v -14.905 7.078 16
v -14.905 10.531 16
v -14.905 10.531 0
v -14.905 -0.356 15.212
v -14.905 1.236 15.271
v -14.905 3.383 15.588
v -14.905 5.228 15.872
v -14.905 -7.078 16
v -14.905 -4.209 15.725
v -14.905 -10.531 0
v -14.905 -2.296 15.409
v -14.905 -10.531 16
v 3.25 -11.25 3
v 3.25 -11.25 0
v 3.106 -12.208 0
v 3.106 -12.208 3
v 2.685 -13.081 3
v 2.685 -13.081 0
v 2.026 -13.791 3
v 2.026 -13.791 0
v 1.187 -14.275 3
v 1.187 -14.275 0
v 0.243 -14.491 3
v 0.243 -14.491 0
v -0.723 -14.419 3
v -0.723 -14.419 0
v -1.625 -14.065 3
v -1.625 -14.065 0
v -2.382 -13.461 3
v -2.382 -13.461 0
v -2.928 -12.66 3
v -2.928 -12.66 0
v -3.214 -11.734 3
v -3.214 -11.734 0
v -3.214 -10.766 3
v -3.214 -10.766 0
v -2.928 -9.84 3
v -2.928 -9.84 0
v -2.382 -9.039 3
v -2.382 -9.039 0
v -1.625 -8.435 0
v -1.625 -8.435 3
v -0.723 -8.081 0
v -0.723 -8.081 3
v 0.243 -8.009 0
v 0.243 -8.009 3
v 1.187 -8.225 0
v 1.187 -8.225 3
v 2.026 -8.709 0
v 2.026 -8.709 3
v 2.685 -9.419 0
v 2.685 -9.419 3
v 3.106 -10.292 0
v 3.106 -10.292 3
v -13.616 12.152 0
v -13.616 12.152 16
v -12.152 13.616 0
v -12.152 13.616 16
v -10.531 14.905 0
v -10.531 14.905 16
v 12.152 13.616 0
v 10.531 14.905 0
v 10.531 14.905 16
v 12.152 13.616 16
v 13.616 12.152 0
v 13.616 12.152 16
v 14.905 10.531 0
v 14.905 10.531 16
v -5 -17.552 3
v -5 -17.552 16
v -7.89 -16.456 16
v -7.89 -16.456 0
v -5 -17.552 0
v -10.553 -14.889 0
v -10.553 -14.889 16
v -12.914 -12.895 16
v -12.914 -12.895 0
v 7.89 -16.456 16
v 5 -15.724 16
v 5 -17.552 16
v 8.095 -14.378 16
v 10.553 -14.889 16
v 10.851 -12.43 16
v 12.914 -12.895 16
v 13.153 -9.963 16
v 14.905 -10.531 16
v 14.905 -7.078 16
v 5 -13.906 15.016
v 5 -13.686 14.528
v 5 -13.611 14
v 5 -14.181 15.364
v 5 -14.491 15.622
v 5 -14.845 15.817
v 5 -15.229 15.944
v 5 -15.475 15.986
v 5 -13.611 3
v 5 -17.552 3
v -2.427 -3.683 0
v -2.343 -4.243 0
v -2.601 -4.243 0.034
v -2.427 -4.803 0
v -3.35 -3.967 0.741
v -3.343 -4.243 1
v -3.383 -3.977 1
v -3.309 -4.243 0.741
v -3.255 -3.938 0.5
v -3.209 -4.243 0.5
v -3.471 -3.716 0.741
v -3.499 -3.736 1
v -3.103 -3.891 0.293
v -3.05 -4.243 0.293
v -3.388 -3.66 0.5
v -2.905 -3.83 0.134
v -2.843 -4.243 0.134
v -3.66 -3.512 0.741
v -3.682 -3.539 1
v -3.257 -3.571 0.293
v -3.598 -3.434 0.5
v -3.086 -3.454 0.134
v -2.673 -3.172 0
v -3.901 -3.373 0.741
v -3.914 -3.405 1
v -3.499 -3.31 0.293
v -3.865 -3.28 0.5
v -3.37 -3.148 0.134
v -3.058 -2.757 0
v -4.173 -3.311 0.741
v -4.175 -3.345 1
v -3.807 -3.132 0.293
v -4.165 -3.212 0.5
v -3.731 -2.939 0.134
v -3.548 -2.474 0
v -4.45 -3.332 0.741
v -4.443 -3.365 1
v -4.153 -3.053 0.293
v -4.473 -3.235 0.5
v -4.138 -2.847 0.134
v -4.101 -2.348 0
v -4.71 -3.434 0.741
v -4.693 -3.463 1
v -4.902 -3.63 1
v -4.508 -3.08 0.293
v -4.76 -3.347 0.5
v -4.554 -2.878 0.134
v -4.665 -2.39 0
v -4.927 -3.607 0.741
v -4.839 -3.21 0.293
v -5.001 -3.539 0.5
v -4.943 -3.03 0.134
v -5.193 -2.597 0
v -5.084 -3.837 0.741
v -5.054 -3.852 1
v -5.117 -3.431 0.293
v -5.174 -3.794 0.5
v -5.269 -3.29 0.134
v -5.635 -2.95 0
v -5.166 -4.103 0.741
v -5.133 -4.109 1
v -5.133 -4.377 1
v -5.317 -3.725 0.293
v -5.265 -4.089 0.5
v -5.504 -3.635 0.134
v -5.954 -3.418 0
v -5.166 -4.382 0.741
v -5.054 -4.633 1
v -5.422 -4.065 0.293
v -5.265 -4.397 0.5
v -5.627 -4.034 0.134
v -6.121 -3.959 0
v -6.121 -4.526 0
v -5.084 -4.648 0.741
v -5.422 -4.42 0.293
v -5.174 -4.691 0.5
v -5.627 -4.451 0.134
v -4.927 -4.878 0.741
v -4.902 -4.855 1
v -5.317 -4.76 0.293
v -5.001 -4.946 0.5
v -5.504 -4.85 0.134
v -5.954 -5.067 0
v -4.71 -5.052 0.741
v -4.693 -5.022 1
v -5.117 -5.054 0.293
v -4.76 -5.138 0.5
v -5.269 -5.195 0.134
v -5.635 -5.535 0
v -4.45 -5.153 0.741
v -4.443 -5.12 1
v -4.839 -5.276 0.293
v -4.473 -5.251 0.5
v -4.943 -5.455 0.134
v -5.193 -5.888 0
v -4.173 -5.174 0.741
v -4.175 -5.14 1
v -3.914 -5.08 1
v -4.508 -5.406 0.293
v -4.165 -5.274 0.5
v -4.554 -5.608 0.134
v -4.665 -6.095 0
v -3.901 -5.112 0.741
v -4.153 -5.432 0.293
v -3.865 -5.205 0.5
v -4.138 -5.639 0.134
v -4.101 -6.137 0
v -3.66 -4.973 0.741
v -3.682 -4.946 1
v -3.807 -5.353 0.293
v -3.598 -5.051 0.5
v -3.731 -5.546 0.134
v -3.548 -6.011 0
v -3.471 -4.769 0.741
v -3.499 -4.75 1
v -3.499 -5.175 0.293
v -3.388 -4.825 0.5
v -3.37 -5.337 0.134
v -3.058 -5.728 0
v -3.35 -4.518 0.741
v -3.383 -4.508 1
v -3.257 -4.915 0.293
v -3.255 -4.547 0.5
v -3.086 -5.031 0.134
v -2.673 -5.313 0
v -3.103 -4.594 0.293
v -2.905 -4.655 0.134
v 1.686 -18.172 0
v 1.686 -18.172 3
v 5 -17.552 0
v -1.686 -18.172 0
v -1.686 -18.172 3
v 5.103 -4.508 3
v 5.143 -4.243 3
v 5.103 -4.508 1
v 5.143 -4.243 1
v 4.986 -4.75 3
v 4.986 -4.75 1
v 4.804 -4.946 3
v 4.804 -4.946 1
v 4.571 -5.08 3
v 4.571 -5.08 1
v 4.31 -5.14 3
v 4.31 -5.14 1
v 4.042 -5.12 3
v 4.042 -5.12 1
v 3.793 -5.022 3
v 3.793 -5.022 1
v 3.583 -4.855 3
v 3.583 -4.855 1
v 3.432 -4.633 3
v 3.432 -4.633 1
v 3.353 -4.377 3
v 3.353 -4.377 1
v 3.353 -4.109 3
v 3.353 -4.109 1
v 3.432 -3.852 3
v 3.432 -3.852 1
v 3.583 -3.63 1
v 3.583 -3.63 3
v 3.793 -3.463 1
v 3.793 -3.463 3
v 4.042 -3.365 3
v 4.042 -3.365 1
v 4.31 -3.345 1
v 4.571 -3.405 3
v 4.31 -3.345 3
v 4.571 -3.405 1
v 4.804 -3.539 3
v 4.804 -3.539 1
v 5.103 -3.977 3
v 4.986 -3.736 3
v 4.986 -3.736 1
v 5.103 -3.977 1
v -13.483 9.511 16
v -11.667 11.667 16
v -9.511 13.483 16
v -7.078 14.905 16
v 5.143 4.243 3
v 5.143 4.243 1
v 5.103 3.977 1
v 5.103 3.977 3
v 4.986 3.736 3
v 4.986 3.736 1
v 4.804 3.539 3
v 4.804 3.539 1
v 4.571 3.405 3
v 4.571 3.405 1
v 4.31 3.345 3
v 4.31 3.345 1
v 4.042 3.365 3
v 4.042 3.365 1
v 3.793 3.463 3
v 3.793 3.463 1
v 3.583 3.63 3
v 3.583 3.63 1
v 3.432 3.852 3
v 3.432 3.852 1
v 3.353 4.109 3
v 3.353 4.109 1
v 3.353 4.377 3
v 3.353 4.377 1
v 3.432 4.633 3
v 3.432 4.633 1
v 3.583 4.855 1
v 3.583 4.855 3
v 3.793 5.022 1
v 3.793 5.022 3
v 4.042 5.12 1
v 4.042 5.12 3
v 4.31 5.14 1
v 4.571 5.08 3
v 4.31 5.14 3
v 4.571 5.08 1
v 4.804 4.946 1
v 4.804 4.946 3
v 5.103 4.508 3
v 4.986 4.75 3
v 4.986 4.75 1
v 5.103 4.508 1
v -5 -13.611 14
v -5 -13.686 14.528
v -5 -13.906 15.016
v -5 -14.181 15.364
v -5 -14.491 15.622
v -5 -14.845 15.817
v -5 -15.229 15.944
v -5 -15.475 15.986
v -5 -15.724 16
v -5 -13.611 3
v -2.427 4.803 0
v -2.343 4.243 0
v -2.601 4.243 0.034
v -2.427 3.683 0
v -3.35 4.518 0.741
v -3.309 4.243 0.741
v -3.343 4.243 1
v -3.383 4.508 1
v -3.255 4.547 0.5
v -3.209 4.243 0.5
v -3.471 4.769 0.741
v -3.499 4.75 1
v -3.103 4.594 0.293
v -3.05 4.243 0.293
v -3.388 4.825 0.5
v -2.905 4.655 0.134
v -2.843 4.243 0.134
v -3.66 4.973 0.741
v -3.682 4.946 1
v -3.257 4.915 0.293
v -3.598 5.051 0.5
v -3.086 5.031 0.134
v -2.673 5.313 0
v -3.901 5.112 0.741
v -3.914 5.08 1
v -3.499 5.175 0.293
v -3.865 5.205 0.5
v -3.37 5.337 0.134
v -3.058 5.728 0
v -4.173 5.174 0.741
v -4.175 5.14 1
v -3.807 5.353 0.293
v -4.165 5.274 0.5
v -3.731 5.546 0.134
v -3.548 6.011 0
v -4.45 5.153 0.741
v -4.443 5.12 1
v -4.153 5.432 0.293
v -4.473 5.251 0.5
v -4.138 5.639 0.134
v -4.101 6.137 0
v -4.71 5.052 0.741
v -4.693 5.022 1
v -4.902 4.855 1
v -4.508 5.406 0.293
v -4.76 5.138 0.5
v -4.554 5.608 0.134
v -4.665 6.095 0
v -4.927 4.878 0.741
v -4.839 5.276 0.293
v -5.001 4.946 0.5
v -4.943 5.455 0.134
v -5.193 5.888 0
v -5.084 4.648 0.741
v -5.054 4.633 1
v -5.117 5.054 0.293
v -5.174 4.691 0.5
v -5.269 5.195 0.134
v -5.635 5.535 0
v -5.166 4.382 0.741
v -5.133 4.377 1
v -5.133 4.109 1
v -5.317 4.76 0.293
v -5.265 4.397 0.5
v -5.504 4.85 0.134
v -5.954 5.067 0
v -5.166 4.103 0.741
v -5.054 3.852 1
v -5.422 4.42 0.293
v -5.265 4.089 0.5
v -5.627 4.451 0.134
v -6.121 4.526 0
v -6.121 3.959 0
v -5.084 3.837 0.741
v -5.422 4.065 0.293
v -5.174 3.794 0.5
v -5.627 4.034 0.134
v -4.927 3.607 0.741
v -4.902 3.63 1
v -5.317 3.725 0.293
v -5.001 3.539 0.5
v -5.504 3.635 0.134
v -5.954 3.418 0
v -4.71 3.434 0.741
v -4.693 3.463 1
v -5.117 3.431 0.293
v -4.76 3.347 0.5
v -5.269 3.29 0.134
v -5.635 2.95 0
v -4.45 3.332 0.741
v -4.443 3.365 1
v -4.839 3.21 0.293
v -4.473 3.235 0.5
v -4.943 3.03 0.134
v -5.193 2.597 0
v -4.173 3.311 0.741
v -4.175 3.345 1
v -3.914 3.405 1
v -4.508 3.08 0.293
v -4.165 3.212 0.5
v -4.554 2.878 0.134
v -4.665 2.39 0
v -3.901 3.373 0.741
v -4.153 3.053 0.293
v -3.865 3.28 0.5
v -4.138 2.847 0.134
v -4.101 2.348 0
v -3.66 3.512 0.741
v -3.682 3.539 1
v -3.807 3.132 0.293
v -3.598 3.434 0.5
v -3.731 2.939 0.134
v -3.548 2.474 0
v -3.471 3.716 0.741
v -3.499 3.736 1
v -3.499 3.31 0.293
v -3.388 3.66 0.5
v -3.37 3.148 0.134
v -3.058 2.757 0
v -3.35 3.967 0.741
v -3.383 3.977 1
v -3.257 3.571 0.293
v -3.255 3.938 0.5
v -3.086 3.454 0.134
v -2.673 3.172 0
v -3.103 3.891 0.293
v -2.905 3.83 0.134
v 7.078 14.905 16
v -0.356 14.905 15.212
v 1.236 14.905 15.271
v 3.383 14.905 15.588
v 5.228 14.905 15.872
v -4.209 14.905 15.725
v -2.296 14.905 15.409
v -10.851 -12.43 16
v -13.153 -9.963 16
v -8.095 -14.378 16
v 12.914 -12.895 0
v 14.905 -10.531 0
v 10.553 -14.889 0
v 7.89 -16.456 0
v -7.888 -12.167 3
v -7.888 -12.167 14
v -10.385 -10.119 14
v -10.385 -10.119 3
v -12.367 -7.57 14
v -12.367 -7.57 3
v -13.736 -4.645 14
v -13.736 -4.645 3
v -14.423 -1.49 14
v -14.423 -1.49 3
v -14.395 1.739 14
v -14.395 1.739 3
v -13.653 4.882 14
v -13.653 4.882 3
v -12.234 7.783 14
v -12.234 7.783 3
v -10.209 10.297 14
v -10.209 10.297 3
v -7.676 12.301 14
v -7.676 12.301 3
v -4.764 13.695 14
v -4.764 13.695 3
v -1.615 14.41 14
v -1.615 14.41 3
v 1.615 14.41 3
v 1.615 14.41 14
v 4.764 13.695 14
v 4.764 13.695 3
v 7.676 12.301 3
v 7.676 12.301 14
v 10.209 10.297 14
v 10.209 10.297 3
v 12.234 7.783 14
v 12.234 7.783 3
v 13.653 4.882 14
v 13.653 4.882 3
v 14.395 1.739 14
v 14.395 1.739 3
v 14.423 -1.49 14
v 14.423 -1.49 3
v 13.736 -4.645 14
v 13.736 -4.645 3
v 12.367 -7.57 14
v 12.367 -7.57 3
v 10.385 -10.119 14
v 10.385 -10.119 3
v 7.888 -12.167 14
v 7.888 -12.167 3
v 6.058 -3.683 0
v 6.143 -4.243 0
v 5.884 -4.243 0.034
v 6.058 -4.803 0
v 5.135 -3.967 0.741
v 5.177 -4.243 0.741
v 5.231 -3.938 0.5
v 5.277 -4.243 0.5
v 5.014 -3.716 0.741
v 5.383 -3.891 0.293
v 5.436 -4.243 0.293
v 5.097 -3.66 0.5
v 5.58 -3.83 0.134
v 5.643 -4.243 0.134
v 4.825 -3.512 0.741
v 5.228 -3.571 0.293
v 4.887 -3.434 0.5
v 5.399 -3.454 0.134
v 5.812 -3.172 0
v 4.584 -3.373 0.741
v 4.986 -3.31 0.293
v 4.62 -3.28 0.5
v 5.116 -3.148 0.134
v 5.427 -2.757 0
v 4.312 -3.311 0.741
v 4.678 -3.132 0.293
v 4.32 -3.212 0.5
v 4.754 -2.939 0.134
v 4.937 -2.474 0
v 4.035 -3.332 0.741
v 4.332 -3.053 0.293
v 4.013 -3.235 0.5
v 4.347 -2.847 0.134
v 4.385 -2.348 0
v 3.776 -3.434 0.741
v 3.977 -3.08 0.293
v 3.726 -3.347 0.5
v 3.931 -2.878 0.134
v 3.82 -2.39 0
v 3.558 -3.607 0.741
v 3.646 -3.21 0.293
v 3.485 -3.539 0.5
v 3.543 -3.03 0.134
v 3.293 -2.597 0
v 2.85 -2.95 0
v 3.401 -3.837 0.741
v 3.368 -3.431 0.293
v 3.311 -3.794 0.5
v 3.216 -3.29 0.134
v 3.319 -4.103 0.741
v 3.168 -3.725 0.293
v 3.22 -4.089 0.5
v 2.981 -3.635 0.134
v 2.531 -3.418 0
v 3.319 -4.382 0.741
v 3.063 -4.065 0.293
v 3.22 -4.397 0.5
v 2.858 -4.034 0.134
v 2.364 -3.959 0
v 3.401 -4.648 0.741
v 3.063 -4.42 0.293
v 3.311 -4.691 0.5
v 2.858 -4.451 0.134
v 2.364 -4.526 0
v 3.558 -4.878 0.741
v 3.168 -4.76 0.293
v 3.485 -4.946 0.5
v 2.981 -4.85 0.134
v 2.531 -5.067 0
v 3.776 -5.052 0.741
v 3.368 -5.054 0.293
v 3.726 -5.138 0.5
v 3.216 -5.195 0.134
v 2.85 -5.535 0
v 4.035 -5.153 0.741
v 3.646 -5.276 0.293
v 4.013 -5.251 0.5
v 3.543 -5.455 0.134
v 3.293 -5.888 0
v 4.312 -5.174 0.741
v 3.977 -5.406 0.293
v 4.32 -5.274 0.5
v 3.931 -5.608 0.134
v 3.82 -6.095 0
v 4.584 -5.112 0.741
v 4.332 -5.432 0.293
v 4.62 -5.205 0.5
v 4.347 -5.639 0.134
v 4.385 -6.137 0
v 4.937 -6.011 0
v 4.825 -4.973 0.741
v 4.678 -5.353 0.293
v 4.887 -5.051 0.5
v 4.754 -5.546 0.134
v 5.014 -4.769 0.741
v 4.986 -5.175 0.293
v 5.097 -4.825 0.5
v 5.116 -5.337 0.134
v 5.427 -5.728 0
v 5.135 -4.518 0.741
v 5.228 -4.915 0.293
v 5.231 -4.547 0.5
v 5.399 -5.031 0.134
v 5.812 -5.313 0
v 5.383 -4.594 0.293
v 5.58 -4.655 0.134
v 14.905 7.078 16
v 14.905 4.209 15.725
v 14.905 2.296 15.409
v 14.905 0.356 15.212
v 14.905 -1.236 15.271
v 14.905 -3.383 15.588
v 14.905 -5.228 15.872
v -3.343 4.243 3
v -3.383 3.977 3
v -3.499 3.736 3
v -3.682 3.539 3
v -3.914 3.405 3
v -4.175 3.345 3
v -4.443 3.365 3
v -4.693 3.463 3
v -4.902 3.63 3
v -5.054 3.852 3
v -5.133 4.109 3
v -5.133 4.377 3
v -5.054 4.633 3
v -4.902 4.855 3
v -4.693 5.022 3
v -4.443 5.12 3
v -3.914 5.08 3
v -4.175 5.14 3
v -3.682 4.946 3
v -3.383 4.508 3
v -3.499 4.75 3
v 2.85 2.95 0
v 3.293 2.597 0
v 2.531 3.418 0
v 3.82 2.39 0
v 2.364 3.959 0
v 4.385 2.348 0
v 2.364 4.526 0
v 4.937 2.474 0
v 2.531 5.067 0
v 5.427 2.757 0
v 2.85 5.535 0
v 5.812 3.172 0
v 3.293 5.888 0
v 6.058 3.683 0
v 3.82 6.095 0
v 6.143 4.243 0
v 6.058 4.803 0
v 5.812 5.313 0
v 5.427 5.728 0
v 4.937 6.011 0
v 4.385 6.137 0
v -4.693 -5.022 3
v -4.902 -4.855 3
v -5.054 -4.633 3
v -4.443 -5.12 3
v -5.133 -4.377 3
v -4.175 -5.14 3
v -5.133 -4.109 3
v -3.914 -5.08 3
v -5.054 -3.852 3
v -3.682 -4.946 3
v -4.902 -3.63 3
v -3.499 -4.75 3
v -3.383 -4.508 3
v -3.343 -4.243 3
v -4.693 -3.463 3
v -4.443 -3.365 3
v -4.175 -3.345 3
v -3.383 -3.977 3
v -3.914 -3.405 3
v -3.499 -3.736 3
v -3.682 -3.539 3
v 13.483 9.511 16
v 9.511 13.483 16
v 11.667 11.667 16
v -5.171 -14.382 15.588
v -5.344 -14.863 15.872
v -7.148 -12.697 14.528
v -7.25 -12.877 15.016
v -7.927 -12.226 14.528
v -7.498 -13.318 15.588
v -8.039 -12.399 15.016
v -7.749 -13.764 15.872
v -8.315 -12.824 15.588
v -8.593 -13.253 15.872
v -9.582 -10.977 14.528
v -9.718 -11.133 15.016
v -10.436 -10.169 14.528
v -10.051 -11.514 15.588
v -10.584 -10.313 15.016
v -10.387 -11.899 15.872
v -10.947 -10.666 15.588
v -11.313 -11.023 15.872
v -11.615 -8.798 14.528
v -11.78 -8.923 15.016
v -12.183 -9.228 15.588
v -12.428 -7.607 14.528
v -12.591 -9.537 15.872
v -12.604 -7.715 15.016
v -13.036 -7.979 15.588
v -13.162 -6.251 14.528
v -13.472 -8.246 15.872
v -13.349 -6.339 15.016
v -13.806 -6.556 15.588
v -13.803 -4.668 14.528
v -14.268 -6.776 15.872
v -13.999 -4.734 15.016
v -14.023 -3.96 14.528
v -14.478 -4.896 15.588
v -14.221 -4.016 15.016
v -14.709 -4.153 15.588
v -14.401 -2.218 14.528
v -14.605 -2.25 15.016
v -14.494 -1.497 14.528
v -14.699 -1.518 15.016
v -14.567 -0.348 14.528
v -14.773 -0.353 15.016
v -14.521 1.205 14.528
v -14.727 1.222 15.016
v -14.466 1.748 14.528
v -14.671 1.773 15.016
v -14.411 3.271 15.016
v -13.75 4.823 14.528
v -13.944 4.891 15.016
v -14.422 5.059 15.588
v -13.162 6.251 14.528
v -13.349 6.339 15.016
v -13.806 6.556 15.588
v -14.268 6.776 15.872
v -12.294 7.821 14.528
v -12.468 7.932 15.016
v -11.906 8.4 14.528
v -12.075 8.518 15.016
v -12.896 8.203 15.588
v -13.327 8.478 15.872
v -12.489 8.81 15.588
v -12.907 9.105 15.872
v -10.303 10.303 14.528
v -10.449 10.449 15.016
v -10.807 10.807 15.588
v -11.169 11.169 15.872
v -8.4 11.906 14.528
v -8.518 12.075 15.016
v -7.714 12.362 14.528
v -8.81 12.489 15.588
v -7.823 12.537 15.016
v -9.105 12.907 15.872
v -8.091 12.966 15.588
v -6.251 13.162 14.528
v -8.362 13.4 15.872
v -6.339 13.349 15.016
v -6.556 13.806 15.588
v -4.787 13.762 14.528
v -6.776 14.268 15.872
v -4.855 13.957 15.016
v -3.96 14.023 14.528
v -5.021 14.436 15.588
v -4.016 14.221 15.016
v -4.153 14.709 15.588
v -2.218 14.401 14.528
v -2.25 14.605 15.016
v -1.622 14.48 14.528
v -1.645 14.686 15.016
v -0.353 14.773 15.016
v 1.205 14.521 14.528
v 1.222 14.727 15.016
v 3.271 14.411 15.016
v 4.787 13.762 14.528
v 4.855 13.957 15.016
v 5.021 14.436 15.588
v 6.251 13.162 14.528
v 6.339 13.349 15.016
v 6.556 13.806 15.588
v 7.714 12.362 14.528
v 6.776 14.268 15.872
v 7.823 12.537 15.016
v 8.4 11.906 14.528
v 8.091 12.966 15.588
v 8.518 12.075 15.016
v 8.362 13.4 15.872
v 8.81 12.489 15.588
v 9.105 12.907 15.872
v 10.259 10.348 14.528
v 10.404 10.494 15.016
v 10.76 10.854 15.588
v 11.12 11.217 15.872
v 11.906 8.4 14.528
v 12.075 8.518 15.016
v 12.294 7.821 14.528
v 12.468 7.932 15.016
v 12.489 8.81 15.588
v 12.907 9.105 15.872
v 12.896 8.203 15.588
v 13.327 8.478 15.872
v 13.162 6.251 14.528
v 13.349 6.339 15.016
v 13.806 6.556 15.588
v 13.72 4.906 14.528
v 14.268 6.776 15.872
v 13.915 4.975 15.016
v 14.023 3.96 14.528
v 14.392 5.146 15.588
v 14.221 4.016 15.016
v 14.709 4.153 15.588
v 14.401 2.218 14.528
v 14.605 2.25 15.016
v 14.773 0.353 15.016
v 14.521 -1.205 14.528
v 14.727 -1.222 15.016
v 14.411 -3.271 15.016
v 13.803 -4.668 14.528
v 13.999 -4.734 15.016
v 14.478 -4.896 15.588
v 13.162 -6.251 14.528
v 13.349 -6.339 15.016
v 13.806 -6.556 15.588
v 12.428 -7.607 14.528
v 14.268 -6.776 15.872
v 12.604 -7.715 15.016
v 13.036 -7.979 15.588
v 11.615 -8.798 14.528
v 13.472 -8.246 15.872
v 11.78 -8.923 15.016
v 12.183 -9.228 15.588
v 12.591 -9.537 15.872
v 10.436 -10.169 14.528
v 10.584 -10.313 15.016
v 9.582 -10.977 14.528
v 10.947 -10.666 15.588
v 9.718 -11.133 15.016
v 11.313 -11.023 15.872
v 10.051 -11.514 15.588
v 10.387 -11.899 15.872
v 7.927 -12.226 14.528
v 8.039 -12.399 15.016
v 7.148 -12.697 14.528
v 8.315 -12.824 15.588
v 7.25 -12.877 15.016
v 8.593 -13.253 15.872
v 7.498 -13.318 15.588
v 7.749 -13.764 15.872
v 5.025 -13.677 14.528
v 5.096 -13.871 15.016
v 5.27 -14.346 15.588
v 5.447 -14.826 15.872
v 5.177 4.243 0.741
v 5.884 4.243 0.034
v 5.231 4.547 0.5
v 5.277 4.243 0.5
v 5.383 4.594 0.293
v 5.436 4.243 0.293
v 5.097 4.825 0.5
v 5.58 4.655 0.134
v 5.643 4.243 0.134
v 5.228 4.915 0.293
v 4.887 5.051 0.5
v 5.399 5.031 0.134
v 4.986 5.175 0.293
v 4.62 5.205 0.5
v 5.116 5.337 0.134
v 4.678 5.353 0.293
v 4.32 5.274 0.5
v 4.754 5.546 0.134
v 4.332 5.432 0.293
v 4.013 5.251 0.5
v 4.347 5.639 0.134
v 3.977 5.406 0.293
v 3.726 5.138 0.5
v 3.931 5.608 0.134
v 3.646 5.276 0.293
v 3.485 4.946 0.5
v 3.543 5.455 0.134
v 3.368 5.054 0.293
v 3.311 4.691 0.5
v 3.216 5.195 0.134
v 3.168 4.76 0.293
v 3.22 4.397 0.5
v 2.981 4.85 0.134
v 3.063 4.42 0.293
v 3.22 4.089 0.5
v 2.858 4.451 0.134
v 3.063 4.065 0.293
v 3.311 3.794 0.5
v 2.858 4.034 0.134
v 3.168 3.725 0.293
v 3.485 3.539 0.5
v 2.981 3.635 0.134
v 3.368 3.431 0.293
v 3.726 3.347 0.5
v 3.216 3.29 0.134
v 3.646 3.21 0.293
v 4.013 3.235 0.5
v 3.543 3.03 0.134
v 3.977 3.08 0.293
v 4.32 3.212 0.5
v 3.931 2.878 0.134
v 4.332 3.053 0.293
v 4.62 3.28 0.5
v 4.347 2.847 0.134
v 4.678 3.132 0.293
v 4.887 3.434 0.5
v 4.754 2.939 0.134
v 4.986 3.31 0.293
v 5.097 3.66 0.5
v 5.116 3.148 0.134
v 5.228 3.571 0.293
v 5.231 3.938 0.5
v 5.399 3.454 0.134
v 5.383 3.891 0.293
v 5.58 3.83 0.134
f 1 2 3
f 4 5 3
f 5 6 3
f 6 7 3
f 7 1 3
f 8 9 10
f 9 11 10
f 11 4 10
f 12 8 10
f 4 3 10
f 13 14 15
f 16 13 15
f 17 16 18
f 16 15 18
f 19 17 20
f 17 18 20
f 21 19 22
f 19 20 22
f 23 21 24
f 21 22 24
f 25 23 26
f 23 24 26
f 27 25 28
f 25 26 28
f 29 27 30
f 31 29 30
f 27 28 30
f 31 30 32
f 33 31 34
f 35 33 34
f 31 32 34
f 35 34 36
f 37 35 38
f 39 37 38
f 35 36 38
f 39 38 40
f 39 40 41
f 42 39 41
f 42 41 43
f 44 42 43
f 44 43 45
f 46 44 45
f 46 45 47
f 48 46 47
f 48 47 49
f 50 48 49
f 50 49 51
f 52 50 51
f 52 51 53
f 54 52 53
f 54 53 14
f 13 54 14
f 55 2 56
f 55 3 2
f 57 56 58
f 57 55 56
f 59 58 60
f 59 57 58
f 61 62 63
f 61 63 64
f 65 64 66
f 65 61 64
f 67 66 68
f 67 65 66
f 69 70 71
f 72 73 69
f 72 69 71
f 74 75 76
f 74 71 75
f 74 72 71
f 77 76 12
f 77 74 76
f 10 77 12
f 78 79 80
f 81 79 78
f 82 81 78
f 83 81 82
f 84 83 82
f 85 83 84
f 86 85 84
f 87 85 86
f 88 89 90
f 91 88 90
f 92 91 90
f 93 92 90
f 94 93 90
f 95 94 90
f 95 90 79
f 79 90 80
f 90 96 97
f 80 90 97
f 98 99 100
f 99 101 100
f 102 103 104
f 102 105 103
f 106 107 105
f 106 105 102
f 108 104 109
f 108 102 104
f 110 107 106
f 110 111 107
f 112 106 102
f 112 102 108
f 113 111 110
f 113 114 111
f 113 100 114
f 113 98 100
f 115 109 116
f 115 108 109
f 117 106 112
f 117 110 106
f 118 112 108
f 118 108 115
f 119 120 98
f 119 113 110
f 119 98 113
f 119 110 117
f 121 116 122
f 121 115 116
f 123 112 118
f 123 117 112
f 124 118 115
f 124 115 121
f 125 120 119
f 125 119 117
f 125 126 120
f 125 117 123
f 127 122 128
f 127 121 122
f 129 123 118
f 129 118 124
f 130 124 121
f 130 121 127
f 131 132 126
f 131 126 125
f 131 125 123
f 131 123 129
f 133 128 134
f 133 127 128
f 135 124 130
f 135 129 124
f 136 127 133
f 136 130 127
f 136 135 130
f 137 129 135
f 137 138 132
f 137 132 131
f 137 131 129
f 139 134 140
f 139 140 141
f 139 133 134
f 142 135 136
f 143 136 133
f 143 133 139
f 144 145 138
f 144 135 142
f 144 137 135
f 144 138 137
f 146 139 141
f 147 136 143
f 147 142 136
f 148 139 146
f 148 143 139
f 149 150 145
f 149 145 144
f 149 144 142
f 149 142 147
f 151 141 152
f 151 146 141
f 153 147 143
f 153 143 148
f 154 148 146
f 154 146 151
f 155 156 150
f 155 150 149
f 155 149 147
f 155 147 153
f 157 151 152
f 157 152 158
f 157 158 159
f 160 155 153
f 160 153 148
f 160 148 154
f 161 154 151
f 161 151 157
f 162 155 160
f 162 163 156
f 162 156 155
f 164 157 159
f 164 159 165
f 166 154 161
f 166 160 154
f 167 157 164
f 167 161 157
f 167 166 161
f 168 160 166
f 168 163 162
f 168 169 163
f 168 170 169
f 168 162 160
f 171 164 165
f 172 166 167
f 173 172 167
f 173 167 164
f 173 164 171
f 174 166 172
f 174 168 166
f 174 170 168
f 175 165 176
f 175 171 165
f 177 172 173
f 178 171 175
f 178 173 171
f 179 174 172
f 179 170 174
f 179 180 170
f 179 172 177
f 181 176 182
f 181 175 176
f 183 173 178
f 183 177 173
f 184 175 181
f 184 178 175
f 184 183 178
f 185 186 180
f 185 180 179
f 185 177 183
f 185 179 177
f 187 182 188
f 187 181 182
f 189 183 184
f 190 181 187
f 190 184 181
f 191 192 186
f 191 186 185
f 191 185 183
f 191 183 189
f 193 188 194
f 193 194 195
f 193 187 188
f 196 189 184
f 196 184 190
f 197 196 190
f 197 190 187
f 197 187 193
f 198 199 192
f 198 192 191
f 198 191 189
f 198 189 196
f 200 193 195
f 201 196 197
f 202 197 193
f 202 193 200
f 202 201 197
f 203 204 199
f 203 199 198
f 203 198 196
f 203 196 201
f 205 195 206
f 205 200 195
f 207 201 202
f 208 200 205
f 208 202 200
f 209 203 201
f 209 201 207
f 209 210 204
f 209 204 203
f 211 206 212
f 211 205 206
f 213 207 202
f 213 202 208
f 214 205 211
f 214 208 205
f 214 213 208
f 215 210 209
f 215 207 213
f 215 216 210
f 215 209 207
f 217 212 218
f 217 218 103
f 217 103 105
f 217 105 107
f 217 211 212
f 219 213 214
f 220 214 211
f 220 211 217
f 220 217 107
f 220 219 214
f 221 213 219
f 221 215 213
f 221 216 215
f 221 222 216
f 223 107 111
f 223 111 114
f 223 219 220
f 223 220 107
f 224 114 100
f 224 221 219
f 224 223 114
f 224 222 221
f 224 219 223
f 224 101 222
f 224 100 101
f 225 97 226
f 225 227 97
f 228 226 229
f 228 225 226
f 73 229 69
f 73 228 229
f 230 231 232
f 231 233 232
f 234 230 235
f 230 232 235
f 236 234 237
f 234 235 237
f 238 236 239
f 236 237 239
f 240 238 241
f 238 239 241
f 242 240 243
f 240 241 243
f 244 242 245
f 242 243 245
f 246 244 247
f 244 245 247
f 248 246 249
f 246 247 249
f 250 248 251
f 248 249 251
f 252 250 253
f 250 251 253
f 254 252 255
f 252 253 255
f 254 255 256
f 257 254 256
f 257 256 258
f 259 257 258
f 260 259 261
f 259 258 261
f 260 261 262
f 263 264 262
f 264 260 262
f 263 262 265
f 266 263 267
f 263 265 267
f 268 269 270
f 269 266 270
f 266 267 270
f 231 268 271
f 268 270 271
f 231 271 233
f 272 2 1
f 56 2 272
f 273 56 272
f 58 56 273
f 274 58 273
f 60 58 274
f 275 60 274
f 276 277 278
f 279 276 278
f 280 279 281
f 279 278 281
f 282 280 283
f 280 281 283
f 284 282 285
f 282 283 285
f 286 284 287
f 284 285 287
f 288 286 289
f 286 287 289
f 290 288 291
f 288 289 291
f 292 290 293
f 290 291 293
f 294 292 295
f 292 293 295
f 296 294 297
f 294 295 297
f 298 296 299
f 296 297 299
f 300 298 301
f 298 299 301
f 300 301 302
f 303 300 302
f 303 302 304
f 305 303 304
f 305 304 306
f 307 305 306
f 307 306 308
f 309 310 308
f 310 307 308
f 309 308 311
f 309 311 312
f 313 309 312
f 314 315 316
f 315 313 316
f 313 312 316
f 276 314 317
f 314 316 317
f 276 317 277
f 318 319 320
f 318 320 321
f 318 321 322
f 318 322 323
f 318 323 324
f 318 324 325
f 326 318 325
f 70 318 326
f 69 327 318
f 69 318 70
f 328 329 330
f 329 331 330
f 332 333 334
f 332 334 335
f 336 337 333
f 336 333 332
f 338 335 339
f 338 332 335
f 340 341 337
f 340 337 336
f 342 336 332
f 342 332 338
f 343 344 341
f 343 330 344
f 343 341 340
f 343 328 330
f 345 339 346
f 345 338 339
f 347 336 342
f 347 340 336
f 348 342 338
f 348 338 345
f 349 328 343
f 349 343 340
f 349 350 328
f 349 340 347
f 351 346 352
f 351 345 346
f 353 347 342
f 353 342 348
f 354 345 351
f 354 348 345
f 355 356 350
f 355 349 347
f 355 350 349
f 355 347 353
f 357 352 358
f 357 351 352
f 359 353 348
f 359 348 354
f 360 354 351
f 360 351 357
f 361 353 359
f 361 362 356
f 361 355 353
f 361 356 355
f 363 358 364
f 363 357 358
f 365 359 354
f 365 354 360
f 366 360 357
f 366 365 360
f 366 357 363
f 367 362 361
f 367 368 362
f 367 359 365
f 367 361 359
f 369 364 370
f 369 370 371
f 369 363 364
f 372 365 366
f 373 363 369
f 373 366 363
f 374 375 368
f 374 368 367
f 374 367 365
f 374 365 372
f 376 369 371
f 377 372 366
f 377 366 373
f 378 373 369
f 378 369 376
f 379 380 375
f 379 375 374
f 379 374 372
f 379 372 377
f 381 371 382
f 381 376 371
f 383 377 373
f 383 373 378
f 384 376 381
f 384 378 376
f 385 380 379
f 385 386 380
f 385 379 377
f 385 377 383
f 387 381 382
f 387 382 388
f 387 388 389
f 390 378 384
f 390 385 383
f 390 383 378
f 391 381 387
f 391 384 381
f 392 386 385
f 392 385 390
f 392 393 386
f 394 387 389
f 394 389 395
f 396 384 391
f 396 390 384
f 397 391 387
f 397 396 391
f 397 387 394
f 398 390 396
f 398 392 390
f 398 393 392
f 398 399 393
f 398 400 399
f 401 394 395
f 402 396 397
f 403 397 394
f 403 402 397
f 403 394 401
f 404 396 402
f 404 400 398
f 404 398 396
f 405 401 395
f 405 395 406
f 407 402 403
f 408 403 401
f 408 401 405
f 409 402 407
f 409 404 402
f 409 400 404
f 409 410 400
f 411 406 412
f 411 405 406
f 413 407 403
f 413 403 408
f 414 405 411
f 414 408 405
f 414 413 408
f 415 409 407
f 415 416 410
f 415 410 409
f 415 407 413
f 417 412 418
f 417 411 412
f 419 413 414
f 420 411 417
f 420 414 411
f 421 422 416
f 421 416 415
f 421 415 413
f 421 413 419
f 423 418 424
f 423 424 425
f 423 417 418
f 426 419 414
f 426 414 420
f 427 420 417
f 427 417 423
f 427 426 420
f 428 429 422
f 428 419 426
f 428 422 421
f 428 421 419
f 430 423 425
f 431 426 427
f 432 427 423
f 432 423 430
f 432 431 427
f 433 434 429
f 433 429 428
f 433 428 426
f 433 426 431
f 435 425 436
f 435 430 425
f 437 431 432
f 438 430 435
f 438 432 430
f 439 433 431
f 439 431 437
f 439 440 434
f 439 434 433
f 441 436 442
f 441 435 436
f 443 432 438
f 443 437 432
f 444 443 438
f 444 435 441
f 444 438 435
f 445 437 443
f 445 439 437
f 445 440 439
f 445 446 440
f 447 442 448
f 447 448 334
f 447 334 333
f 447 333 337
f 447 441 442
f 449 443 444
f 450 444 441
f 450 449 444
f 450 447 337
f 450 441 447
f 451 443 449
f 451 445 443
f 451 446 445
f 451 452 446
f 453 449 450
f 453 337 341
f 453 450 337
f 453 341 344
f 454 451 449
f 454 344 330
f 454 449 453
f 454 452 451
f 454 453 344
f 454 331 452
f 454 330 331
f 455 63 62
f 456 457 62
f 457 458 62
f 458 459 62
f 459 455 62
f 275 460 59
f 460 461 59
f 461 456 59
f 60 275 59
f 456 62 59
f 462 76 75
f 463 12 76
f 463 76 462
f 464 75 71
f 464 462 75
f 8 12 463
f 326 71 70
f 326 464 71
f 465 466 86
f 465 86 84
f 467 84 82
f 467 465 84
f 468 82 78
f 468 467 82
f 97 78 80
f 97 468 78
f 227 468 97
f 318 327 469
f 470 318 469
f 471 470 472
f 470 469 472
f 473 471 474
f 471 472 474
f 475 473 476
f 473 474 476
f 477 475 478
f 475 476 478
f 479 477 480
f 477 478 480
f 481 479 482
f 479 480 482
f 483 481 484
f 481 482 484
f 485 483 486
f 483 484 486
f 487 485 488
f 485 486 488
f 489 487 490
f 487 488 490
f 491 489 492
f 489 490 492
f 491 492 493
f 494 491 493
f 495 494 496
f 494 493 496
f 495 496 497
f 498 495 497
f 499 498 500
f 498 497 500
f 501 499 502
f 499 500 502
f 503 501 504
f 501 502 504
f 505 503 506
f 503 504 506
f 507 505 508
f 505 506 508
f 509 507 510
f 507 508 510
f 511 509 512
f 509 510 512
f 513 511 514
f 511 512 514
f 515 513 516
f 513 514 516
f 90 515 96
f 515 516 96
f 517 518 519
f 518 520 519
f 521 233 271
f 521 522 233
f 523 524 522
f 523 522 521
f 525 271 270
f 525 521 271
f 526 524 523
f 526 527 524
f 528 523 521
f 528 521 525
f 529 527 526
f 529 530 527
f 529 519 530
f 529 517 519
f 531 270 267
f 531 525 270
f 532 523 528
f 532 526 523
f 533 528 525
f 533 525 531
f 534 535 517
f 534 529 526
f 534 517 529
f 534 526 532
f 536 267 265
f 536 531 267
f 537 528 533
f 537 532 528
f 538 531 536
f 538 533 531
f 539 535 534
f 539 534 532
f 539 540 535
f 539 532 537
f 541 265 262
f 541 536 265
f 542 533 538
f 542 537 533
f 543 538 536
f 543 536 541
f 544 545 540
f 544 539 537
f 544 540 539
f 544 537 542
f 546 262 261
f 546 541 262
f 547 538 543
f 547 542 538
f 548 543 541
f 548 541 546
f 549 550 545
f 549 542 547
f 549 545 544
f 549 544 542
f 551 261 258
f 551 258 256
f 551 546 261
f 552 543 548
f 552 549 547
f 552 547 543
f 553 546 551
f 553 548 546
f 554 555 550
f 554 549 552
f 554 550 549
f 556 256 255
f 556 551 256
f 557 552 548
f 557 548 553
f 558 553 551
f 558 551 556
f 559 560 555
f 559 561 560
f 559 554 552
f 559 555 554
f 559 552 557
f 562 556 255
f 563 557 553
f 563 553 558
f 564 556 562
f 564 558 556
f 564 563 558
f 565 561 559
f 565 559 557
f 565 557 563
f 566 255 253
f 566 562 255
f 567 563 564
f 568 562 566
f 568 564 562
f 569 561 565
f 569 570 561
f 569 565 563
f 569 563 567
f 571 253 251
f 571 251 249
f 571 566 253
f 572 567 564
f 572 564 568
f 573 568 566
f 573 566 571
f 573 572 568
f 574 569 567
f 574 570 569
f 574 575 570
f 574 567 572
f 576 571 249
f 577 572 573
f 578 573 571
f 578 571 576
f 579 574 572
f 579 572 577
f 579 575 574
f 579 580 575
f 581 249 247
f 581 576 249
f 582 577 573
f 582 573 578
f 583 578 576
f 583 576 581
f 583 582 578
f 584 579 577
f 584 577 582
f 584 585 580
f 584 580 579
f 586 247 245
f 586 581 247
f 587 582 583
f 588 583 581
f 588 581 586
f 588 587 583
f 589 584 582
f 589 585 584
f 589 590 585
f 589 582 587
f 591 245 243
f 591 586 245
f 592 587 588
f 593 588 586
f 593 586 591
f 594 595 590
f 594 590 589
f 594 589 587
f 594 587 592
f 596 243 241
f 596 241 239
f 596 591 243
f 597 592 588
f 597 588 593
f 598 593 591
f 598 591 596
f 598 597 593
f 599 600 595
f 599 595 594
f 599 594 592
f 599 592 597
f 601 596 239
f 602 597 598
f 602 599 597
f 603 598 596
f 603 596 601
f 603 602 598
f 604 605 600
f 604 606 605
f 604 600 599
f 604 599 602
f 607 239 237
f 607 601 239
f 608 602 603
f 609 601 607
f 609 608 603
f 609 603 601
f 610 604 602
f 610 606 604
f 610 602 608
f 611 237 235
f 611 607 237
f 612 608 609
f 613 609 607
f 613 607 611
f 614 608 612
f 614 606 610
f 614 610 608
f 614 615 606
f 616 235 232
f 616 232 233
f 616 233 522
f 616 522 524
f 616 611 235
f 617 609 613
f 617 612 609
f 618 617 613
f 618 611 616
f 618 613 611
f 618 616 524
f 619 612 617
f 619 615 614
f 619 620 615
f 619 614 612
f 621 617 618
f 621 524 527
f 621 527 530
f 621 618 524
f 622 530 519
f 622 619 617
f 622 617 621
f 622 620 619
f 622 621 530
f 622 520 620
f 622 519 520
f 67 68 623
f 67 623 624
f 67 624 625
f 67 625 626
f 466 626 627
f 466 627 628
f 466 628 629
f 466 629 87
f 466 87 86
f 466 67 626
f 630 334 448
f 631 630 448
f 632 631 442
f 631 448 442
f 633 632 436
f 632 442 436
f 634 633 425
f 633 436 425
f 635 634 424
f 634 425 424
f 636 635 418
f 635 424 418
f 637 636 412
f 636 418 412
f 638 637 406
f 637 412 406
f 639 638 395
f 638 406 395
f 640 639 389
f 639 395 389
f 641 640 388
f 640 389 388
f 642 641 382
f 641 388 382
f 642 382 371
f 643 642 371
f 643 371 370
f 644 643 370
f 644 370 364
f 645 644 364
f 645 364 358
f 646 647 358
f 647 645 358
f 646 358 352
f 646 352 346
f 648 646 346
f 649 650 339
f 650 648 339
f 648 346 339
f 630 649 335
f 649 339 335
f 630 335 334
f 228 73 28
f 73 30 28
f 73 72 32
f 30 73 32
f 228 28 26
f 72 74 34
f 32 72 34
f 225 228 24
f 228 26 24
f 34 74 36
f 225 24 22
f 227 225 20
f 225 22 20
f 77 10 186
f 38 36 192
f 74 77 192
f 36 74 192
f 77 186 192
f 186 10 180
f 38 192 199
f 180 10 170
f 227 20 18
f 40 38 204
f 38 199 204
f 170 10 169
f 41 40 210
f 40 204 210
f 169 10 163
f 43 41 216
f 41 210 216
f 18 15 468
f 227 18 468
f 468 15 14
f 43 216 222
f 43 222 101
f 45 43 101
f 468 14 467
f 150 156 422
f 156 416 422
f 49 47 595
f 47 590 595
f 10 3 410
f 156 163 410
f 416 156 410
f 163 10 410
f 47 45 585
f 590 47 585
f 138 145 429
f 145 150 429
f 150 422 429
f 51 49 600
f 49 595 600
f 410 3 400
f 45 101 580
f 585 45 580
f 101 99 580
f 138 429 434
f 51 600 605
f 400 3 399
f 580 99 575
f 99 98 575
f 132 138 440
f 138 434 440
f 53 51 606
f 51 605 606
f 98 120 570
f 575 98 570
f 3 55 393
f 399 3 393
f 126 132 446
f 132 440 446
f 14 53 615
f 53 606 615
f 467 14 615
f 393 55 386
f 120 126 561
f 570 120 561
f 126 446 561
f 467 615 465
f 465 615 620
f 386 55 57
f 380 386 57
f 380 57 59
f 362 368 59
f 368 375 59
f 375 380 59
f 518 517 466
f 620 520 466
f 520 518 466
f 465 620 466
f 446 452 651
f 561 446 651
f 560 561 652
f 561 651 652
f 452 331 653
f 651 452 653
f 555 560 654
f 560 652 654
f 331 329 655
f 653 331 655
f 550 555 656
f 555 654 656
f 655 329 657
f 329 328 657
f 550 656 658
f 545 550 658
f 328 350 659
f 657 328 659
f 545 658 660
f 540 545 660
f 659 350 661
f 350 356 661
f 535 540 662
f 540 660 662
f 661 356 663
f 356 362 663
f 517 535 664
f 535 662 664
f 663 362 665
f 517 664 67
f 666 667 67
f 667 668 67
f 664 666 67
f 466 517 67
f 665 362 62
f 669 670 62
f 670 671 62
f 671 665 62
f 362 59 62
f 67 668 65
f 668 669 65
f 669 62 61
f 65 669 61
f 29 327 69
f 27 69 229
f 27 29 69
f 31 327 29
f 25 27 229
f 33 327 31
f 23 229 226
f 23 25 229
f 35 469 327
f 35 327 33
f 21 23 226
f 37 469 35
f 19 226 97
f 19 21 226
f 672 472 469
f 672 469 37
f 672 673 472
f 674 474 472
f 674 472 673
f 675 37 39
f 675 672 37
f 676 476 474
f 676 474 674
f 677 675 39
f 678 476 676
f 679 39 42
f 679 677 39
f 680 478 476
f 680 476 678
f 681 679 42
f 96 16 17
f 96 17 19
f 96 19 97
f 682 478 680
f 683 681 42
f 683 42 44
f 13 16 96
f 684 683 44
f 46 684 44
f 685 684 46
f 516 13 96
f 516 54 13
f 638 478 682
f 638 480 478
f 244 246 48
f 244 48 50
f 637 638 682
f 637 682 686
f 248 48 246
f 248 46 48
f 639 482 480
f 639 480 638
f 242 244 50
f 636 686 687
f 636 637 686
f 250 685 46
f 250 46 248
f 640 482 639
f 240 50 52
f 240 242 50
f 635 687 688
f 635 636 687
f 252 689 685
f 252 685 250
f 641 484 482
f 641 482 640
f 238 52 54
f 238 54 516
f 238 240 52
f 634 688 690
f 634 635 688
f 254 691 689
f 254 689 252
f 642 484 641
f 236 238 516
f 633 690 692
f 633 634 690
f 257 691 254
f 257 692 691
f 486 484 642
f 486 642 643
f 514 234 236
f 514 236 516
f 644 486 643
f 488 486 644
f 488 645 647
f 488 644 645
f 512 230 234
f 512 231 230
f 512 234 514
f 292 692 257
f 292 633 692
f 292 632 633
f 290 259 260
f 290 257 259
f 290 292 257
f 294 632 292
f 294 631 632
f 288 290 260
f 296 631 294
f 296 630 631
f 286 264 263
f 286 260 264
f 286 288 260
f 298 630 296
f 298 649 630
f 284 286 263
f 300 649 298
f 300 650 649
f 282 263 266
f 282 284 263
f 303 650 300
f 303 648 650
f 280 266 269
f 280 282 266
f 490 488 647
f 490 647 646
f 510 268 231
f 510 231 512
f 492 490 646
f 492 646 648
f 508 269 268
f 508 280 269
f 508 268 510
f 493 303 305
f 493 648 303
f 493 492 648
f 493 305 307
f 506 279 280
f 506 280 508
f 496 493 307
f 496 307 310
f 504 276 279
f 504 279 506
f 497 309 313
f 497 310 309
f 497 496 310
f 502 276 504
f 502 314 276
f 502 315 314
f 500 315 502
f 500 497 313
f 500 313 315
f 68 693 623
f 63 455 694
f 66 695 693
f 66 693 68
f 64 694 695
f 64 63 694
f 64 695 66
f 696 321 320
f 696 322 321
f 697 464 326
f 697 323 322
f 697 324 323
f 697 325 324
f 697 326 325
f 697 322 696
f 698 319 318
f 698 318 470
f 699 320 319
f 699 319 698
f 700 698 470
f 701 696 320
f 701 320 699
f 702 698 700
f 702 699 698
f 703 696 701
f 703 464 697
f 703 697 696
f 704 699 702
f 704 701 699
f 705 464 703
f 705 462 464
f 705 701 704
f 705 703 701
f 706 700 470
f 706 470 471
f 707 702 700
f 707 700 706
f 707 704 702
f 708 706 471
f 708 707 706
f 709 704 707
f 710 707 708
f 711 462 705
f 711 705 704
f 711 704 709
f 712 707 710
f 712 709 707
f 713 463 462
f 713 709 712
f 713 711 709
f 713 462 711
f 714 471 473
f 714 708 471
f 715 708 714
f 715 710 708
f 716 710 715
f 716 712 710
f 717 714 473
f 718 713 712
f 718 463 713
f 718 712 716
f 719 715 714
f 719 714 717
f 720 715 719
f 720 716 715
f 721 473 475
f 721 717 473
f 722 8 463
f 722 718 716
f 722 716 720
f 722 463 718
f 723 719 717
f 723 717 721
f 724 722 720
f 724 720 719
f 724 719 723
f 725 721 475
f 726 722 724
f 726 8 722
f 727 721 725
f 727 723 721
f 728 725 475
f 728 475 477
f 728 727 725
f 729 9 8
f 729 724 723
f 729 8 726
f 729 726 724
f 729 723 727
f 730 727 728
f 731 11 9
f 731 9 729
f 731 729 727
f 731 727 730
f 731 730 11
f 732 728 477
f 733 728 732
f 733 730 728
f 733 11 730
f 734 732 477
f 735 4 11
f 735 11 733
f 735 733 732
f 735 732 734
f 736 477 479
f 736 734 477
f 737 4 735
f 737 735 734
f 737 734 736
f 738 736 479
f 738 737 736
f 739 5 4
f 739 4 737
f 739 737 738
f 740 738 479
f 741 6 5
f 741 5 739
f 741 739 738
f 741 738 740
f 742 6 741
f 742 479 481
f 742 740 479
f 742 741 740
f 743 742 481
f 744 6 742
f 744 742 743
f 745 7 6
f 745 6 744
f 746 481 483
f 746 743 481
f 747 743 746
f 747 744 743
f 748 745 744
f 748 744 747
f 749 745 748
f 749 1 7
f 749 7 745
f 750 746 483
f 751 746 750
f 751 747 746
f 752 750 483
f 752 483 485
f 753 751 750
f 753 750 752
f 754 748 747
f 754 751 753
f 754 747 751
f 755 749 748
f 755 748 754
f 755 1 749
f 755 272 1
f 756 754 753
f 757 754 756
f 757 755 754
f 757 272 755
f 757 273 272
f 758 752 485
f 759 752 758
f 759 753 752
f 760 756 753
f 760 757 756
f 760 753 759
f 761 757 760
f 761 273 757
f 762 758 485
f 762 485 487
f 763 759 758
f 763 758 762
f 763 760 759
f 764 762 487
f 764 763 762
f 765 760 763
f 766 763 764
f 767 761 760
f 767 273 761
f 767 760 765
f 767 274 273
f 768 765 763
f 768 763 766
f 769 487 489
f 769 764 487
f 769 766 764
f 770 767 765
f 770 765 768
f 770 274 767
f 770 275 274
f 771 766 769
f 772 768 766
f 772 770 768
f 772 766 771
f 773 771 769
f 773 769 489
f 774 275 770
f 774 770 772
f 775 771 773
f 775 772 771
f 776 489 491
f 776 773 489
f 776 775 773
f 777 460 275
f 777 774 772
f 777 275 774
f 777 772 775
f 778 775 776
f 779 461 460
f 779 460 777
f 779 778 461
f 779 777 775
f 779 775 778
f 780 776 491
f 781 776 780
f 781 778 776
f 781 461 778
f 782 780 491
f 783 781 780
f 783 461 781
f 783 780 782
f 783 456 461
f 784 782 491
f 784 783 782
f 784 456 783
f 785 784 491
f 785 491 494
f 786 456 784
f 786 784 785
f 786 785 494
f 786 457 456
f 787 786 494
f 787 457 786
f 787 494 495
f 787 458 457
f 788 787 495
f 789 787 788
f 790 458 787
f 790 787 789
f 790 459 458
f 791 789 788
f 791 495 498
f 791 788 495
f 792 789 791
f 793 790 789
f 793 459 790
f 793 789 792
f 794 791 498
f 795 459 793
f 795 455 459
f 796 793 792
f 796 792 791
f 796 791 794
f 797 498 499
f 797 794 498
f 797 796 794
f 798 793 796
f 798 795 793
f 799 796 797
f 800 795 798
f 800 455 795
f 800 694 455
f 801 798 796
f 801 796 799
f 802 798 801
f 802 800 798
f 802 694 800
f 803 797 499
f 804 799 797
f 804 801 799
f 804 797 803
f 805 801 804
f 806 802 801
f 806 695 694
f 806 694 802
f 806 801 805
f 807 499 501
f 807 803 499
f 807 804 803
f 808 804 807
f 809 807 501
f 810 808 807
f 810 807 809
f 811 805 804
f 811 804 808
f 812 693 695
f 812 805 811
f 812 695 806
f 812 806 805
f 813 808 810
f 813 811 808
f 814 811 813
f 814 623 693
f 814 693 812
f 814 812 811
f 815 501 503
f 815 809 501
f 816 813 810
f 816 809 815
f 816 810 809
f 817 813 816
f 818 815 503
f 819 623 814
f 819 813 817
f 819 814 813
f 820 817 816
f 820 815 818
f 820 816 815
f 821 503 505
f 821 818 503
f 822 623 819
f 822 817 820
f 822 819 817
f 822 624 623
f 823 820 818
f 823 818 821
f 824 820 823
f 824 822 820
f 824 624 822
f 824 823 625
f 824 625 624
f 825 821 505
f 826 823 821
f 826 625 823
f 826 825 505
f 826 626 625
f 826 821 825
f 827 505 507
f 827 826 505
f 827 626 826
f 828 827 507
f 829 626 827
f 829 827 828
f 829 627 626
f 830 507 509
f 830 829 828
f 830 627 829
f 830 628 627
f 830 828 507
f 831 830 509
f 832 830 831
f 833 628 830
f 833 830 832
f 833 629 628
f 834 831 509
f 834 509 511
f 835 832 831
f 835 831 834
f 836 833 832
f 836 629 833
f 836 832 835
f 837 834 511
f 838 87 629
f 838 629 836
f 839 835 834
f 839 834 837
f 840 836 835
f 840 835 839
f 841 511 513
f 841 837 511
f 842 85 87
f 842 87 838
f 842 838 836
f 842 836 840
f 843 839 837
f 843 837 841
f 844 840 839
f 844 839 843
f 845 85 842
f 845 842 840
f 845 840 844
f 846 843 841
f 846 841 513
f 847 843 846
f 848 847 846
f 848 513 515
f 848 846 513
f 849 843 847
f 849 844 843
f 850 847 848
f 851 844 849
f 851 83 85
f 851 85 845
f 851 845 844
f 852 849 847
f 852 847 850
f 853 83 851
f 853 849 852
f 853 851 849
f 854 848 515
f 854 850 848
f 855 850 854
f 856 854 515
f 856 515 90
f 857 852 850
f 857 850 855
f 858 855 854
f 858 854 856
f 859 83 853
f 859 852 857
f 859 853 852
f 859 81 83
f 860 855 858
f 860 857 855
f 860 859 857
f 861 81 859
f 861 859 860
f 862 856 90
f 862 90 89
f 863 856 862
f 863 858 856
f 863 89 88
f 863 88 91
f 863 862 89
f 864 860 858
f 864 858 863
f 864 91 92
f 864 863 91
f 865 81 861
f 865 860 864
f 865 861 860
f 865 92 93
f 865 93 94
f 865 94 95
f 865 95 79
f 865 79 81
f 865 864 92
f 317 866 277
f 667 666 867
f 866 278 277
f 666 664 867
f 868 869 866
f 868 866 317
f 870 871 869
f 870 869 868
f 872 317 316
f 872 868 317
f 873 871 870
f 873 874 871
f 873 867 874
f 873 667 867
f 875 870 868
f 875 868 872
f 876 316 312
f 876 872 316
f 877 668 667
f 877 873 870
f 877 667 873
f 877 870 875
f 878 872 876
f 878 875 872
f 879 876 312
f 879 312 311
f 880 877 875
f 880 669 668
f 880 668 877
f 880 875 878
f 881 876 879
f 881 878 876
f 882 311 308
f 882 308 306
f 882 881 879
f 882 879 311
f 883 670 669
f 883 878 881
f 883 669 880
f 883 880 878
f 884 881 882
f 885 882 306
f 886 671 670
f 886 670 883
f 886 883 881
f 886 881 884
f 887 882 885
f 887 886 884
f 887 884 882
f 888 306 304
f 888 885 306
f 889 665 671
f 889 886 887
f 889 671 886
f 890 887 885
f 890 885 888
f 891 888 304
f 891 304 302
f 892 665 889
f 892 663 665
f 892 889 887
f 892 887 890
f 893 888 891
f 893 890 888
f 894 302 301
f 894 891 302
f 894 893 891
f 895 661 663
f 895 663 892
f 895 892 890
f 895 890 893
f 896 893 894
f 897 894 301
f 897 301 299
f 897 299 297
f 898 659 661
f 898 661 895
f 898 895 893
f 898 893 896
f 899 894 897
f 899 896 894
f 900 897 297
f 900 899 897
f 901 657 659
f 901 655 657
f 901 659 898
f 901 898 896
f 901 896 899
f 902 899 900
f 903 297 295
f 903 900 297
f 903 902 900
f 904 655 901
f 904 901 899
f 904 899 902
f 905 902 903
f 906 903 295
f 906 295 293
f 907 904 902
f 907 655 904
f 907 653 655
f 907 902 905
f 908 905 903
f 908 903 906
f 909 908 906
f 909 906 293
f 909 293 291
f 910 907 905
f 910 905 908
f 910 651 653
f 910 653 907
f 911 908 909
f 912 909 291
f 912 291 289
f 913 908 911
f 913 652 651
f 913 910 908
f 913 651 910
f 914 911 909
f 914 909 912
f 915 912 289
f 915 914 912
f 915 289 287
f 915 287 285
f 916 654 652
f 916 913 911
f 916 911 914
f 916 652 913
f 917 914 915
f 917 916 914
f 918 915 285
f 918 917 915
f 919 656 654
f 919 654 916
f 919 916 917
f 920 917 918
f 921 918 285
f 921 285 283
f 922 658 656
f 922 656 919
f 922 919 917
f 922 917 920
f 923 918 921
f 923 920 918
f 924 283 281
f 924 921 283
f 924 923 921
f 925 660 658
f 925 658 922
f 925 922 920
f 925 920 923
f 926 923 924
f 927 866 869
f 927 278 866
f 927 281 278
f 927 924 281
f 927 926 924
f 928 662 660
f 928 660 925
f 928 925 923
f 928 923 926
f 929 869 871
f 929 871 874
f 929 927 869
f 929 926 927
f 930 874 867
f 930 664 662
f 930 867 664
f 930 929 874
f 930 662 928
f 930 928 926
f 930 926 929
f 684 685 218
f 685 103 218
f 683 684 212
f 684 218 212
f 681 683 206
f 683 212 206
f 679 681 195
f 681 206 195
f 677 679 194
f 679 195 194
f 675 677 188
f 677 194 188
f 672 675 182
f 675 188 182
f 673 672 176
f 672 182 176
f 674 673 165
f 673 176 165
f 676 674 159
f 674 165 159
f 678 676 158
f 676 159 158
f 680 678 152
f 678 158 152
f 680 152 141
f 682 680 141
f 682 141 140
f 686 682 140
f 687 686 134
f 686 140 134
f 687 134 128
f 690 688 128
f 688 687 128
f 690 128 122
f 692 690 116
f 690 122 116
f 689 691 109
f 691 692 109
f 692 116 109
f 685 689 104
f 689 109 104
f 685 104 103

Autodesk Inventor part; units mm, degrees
ref_plane "YZ Plane" through (0, 0, 0) normal (1, 0, 0) x (0, 1, 0)
ref_plane "XZ Plane" through (0, 0, 0) normal (0, 1, 0) x (-1, 0, 0)
ref_plane "XY Plane" through (0, 0, 0) normal (0, 0, 1) x (1, 0, 0)
sketch "Sketch1" plane through (0, 0, 0) normal (0, 0, 1) x (1, 0, 0)
  circle A0 centre (0, 0) radius 18.25 construction
  line L0 (12.904699, -12.904699) -> (-12.904699, 12.904699) construction
  line L1 (0, 29) -> (0, -41) construction
  line L2 (-75, 0) -> (78, 0) construction
  line L3 (-12.904699, -12.904699) -> (12.904699, 12.904699) construction
  line L4 (-12.904699, 12.904699) -> (12.904699, 12.904699) construction
  line L5 (12.904699, -12.904699) -> (12.904699, 12.904699) construction
  line L6 (-12.904699, -12.904699) -> (-12.904699, 12.904699) construction
  circle A1 centre (-4.242641, 4.242641) radius 0.9
  circle A2 centre (4.242641, 4.242641) radius 0.9
  circle A3 centre (-4.242641, -4.242641) radius 0.9
  circle A4 centre (4.242641, -4.242641) radius 0.9
  circle A5 centre (0, 0) radius 14.5
  line L7 (10.531498, 14.904699) -> (-10.531498, 14.904699)
  line L8 (-14.904699, 10.531498) -> (-14.904699, -10.531498)
  line L9 (14.904699, 10.531498) -> (14.904699, -10.531498)
  arc A6 (-10.531498, 14.904699) -> (-14.904699, 10.531498) centre (0, 0) ccw
  arc A7 (14.904699, 10.531498) -> (10.531498, 14.904699) centre (0, 0) ccw
  line L10 (-5, -13.610658) -> (-5, -17.551709)
  line L11 (5, -13.610658) -> (5, -17.551709)
  arc A8 (-14.904699, -10.531498) -> (-5, -17.551709) centre (0, 0) ccw
  arc A9 (5, -17.551709) -> (14.904699, -10.531498) centre (0, 0) ccw
  arc A10 (-5, -17.551709) -> (5, -17.551709) centre (0, 0) ccw
  circle A11 centre (0, -11.25) radius 3.25
  circle A12 centre (0, 0) radius 6 construction
  point P0 (5, -13.610658)
  point P1 (0, -14.5)
  point P2 (2.557391, -13.255556)
  point P3 (0, 0)
  dimension "d0" = 36.5
  dimension "d7" = 29
  dimension "d27" = 12
  dimension "d4" = 1.8
  dimension "d9" = 2
  dimension "d10" = 2
  dimension "d11" = 5
  dimension "d22" = 6.5
  dimension "d25" = 11.25
  dimension "d29" = 45
extrude "Extrusion1" add sketch "Sketch1" along normal blind 3 contours A11 | A5 | A5 L11 A10 L10
extrude "Extrusion2" add sketch "Sketch1" along normal blind 16 contours A5 L10 A8 L8 A6 L7 A7 L9 A9 L11
fillet "Fillet2" radius 1 4 edges at (3.3426, 4.2426, 0) (3.3426, -4.2426, 0) (-5.1426, -4.2426, 0) (-5.1426, 4.2426, 0)
extrude "Extrusion3" cut sketch "Sketch1" along normal blind 12 contours A11
fillet "Fillet3" radius 2 1 edges at (0, 14.5, 16)
properties part number "engine_cup"
